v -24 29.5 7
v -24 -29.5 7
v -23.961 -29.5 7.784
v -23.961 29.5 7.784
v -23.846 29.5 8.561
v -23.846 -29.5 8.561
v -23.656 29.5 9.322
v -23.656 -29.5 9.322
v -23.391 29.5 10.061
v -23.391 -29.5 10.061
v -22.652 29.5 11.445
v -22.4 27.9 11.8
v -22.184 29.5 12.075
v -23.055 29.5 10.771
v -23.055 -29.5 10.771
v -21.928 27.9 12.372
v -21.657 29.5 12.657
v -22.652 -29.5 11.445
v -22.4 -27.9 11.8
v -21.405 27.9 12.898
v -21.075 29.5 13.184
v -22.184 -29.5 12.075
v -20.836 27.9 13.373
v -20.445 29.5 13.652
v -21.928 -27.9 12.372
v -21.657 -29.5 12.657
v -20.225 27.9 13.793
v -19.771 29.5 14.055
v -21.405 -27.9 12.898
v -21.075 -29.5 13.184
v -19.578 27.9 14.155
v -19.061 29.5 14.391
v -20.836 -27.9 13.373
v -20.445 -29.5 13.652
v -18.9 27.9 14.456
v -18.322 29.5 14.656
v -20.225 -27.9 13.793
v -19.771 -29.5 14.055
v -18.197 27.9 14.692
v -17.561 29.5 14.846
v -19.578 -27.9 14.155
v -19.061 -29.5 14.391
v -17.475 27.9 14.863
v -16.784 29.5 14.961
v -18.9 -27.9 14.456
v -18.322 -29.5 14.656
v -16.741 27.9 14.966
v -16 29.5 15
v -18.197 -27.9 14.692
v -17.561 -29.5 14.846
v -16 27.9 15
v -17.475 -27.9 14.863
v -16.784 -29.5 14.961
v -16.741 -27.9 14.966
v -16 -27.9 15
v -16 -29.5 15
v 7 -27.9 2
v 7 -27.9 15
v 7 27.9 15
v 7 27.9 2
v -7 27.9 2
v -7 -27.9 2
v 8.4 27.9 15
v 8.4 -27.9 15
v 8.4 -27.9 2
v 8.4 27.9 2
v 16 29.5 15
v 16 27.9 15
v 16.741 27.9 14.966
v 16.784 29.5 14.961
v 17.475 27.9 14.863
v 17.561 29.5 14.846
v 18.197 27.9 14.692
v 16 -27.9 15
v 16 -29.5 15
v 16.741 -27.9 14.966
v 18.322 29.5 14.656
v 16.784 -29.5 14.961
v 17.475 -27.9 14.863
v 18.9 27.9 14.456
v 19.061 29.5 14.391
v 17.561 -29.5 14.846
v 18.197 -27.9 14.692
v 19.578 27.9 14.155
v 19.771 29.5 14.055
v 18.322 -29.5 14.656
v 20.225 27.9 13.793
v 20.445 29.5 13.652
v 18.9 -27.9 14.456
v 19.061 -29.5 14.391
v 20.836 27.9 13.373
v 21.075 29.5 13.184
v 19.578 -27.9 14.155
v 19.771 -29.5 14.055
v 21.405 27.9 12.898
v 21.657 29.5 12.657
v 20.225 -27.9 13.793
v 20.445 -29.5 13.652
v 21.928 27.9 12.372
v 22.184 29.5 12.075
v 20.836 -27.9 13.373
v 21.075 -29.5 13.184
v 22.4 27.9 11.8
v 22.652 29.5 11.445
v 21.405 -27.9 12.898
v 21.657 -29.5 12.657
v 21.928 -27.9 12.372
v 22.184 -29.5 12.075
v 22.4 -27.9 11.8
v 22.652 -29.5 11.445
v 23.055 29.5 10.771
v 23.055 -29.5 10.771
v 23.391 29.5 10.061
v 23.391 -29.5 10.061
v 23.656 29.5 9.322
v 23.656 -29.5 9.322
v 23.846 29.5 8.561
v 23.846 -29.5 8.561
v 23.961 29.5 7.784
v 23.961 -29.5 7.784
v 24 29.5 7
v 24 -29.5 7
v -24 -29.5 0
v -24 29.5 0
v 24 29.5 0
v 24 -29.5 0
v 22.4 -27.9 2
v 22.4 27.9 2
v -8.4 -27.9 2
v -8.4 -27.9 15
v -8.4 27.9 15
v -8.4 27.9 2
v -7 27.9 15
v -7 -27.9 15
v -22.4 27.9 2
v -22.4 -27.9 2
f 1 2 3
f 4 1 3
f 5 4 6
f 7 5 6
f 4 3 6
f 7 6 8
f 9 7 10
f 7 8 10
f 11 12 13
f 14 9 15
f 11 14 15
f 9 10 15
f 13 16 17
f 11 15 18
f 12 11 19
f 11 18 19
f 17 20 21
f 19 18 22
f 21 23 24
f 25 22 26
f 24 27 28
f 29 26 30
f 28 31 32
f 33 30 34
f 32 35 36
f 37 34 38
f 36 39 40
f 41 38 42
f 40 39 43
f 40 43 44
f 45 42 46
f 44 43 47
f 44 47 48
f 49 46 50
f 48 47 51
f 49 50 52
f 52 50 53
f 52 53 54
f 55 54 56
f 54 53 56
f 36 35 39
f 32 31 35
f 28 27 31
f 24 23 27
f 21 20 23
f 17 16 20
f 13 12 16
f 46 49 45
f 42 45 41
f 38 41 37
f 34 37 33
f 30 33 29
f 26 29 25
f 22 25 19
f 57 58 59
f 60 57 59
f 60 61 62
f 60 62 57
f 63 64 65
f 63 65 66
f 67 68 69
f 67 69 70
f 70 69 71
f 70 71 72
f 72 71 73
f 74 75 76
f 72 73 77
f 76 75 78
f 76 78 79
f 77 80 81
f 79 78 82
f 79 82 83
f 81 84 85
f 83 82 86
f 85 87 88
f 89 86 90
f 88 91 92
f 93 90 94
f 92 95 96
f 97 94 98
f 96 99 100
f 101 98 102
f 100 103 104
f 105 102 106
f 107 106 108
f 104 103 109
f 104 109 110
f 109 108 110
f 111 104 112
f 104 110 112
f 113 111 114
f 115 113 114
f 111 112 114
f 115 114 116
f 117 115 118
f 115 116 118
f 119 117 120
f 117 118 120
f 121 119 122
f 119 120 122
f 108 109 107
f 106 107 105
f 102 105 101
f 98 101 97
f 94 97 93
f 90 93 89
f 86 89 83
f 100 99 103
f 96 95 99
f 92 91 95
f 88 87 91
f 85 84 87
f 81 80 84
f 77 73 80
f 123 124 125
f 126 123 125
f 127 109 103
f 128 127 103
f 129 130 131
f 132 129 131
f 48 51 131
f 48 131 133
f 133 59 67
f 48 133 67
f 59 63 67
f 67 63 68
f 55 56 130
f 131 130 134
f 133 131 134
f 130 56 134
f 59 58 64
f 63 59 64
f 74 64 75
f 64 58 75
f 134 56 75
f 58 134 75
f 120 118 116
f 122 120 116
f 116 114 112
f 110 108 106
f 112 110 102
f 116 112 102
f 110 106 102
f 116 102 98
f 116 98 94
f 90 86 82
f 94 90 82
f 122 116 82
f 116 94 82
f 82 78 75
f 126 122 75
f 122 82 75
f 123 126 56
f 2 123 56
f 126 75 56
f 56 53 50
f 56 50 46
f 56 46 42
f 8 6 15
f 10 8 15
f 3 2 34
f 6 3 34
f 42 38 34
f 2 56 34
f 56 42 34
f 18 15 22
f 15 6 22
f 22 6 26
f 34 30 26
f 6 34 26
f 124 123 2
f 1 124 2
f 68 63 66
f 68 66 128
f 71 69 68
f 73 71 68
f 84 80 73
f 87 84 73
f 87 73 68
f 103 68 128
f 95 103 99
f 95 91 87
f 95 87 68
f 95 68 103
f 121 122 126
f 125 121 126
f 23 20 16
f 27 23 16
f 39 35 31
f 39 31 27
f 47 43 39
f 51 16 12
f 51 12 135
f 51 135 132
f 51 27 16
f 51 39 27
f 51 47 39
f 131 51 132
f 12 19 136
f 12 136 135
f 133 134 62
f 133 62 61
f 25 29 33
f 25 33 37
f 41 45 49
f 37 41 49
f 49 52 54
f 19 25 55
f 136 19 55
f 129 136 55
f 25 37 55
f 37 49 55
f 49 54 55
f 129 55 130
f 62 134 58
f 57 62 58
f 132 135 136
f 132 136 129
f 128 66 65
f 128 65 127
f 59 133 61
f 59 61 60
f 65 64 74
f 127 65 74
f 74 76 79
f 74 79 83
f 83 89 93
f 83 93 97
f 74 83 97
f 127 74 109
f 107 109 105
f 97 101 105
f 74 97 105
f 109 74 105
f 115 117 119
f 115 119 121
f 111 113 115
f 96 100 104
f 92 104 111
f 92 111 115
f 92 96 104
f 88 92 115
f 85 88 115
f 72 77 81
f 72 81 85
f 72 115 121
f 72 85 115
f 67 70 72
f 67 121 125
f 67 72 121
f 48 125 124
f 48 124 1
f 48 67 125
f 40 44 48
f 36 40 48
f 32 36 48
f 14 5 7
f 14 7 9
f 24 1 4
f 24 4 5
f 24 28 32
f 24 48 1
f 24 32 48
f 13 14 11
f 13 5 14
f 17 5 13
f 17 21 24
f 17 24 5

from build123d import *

# Parameters (mm, degrees)
SKETCH1_W           = 48
SKETCH1_H           = 59
BOSS_EXTRUDE1_DEPTH = 2
BOSS_EXTRUDE2_DEPTH = 59
SKETCH3_W           = 14
SKETCH3_H           = 55.8
CUT_EXTRUDE1_DEPTH  = 13


with BuildPart() as part:
    # Sketch1 → Boss-Extrude1 (new body)
    with BuildSketch(Plane.XY):
        Rectangle(SKETCH1_W, SKETCH1_H)
    extrude(amount=BOSS_EXTRUDE1_DEPTH)

    # Sketch2 → Boss-Extrude2 (add)
    with BuildSketch(Plane.XZ.offset(29.5)):
        with BuildLine():
            Line((-16, 15), (16, 15))
            ThreePointArc((16, 15), (21.656854249, 12.656854249), (24, 7))
            Line((24, 7), (24, 2))
            Line((24, 2), (-24, 2))
            Line((-24, 2), (-24, 7))
            ThreePointArc((-24, 7), (-21.656854249, 12.656854249), (-16, 15))
        make_face()
    extrude(amount=-BOSS_EXTRUDE2_DEPTH)

    # Sketch3 → Cut-Extrude1 (cut)
    with BuildSketch(Plane.XY.offset(15)):
        Rectangle(SKETCH3_W, SKETCH3_H)
        with Locations((15.4, 0)):
            Rectangle(SKETCH3_W, SKETCH3_H)
        with Locations((-15.4, 0)):
            Rectangle(SKETCH3_W, SKETCH3_H)
    extrude(amount=-CUT_EXTRUDE1_DEPTH, mode=Mode.SUBTRACT)


solid = part.part
